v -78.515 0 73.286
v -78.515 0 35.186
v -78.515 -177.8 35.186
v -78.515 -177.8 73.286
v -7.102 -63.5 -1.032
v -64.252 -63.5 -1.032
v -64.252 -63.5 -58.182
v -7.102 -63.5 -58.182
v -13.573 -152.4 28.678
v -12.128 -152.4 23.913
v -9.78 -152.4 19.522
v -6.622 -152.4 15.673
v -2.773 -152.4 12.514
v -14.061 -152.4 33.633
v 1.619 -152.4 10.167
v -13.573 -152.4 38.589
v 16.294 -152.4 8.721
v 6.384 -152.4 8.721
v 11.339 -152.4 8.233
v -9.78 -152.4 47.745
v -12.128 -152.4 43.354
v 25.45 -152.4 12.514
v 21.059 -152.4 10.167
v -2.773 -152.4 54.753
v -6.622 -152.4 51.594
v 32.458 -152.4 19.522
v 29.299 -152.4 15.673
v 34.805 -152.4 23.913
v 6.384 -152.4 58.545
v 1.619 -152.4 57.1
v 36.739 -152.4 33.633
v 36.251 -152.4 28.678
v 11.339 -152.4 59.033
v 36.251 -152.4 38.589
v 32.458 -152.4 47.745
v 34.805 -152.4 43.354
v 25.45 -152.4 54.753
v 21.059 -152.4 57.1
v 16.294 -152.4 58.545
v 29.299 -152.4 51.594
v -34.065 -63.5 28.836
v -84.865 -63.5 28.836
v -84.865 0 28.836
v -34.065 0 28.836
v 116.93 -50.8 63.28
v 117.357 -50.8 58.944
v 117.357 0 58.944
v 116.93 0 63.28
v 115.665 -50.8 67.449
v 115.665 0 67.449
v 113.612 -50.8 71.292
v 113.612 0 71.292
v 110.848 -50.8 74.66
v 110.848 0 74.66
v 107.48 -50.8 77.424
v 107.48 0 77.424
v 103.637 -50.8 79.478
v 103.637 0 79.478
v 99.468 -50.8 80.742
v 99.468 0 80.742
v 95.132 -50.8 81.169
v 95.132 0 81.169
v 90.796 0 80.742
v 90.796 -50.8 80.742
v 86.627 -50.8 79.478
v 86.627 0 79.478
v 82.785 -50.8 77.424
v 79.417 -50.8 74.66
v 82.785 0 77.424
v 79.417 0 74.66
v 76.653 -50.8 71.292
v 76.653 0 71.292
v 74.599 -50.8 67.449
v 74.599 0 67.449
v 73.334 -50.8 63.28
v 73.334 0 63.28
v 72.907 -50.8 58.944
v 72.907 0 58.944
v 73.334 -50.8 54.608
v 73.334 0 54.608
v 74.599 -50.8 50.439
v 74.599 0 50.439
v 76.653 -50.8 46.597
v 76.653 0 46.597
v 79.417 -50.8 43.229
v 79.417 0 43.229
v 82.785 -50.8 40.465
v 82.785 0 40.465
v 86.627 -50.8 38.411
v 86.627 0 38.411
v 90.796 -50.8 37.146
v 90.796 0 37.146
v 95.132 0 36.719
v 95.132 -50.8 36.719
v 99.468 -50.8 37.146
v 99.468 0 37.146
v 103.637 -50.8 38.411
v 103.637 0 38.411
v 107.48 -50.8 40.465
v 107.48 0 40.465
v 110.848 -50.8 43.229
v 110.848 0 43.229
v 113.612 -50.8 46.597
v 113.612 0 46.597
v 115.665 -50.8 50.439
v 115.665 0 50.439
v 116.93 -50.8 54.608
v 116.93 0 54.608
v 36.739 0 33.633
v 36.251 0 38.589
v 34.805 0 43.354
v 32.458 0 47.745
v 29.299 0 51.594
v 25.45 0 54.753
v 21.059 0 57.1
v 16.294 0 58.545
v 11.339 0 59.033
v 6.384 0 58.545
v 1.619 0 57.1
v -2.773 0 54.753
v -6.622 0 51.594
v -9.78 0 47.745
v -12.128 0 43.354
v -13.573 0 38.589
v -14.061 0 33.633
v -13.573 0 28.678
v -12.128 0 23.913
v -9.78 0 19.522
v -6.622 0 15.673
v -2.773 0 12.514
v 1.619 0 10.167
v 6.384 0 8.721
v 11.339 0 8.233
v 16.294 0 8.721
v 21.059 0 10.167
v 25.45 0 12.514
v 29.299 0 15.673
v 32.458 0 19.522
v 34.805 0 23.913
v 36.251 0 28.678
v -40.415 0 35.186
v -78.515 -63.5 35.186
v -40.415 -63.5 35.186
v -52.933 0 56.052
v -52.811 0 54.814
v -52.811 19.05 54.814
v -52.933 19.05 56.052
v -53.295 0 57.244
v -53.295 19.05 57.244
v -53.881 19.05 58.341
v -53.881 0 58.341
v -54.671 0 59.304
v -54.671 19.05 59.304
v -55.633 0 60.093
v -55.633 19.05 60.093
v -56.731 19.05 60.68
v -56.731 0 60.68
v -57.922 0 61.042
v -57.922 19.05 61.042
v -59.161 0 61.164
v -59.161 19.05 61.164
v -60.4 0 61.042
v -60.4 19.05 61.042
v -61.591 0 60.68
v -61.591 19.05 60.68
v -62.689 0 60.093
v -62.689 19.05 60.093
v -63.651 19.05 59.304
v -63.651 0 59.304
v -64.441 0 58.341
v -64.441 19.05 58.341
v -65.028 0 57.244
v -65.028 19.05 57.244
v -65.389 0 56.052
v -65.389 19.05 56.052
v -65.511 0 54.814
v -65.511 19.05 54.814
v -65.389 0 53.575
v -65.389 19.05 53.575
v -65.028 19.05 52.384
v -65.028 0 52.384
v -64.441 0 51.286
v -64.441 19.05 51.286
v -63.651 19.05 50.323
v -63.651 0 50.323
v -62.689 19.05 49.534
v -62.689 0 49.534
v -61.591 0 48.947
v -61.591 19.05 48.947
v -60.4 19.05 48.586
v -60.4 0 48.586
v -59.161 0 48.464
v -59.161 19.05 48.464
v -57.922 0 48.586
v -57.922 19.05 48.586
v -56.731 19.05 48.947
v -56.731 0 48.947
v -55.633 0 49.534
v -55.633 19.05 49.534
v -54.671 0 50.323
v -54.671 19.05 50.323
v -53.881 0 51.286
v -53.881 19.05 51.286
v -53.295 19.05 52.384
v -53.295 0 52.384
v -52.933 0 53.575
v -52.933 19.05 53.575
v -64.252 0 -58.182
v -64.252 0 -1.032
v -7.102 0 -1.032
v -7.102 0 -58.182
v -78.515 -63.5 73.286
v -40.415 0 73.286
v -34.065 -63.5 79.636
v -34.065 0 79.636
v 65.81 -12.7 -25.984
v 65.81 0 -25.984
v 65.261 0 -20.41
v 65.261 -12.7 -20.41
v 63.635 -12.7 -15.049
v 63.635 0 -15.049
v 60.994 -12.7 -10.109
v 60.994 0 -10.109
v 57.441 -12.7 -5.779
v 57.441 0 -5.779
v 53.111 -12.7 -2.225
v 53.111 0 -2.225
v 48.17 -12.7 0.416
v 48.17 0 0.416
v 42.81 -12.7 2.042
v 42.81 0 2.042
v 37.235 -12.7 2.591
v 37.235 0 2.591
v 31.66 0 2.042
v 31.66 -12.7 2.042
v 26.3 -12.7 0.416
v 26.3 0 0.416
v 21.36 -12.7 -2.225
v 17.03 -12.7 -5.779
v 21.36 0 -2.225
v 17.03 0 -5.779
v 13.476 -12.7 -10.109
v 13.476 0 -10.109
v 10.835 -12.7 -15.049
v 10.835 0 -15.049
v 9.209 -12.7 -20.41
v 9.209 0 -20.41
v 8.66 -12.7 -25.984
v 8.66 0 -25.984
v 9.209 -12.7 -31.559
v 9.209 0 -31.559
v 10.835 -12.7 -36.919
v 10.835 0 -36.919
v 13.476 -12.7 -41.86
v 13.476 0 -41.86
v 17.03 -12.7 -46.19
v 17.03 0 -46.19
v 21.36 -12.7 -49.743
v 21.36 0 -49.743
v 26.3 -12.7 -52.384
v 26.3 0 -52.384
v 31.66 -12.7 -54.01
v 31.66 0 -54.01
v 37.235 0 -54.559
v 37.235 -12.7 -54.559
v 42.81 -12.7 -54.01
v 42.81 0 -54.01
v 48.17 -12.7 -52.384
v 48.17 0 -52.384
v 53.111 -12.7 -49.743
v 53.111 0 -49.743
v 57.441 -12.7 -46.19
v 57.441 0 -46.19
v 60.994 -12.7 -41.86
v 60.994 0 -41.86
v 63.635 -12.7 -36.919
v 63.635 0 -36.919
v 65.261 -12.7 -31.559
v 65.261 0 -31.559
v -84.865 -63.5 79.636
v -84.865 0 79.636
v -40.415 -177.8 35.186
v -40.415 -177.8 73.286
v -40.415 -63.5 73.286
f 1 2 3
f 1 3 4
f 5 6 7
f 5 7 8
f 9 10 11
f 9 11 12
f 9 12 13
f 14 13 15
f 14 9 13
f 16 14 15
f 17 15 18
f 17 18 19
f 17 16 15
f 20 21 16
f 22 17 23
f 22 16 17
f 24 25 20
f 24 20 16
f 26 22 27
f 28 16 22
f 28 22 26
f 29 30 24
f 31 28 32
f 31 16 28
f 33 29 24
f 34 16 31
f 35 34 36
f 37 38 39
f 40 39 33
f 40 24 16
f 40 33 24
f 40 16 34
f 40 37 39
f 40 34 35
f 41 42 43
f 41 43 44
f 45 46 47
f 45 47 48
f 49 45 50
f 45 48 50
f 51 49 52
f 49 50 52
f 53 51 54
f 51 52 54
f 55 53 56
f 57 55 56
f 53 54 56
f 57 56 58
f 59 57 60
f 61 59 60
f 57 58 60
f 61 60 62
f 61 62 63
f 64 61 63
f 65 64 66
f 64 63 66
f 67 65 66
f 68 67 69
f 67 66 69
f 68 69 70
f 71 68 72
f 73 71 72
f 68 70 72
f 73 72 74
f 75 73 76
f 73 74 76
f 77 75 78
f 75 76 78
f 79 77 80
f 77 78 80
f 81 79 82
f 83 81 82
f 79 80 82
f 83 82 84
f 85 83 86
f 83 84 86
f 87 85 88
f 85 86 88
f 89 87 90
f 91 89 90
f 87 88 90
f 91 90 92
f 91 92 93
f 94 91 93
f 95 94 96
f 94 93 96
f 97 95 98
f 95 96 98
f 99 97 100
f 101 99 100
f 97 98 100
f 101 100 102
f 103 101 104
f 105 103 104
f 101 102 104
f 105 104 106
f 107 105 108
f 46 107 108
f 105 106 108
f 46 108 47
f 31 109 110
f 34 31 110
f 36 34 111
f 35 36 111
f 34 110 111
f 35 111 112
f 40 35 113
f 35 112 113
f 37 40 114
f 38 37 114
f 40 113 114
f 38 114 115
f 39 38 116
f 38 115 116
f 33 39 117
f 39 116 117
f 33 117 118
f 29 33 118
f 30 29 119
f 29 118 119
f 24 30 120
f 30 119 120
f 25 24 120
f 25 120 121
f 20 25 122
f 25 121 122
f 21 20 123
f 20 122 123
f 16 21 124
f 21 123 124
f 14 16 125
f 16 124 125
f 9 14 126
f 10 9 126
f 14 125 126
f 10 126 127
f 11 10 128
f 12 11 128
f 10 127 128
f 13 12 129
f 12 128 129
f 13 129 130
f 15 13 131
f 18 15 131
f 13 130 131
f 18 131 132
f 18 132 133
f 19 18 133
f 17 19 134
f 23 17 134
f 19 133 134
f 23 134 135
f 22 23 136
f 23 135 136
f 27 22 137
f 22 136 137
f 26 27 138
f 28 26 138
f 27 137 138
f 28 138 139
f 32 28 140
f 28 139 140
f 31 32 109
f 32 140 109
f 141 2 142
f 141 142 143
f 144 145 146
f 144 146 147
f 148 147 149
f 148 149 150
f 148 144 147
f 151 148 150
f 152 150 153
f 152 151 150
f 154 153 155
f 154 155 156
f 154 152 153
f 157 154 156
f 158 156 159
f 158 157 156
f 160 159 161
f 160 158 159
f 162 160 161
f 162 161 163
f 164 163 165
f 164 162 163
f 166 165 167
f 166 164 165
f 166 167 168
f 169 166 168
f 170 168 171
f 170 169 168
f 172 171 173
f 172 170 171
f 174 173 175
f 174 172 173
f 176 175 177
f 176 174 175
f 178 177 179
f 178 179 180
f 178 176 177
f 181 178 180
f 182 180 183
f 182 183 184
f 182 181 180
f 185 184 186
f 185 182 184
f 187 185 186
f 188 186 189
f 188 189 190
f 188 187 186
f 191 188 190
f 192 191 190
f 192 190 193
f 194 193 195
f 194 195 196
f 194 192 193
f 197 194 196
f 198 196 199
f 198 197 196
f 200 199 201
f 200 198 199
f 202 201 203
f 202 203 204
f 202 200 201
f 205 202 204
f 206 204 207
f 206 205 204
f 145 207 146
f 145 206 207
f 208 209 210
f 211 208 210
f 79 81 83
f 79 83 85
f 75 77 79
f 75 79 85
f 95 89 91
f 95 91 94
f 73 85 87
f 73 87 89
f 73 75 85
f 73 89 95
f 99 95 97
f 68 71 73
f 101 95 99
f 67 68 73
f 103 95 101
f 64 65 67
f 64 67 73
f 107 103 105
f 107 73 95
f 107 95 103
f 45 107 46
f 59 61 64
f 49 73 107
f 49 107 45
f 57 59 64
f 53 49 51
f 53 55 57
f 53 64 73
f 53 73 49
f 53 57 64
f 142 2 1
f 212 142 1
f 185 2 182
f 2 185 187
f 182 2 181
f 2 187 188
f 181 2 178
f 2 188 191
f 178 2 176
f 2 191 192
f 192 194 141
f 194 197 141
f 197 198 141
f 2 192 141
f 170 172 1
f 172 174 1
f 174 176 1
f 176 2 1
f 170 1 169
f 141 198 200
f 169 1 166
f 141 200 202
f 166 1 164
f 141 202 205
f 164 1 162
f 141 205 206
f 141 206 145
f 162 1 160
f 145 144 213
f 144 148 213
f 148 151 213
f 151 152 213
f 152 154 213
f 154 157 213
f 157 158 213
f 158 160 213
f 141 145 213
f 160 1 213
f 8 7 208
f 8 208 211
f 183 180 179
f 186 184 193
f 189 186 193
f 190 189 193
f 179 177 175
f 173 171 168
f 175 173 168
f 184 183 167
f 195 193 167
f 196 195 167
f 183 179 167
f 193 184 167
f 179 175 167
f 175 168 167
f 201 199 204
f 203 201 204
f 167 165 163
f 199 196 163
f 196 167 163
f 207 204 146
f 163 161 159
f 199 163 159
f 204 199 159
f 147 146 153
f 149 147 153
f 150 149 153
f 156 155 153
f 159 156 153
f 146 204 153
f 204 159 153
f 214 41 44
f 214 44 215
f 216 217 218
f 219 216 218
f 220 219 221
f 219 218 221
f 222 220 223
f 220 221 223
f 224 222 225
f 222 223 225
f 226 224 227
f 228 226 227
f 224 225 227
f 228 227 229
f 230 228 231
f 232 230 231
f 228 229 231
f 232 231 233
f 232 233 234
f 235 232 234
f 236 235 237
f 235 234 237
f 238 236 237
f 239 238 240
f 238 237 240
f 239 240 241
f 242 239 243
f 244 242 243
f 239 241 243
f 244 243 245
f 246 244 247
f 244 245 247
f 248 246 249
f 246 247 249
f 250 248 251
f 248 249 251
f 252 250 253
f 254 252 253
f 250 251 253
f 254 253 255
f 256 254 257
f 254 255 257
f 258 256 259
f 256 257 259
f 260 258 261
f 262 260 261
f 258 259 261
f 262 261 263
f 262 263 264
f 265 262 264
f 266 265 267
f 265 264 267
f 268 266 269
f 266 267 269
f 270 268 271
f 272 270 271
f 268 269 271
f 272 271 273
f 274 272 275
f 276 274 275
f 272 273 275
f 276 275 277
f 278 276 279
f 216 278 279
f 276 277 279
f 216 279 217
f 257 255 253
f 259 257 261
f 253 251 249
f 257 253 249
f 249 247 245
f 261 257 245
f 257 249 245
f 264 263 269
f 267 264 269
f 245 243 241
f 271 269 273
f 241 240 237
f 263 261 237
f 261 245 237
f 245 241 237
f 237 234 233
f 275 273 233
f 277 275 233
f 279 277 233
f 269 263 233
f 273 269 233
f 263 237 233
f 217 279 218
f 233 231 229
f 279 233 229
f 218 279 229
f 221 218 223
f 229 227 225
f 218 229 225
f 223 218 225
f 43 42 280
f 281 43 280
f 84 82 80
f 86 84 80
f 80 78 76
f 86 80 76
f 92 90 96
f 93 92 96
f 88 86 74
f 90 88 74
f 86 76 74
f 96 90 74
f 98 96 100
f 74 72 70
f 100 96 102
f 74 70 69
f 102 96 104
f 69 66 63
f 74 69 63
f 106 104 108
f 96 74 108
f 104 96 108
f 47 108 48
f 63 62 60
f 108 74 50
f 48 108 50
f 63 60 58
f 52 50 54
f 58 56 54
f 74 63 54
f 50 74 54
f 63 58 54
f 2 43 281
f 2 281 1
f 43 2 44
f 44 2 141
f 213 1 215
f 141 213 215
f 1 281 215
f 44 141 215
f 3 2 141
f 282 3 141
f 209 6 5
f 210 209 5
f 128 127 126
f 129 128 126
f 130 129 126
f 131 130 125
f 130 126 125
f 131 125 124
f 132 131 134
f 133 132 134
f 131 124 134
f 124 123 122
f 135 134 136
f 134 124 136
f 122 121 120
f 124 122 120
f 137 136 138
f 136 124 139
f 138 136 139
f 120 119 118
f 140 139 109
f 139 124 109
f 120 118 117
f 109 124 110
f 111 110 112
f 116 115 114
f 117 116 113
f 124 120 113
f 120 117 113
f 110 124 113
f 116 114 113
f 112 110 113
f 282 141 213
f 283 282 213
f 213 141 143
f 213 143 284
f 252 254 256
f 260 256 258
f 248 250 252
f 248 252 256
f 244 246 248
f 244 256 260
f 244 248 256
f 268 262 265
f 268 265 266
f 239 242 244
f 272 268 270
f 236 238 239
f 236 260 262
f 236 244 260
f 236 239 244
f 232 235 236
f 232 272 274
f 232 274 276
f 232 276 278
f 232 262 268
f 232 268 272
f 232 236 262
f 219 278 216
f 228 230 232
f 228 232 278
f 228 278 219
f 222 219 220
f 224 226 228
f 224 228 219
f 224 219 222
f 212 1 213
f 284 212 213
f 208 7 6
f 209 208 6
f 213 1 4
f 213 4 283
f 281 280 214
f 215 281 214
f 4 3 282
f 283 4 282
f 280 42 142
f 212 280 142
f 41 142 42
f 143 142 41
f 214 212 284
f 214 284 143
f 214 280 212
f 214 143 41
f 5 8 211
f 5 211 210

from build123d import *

# Parameters (mm, degrees)
F0_R     = 25.4
F1_DEPTH = 152.4
F0_R_2   = 28.575
F2_DEPTH = 12.7
F0_W     = 57.15
F0_H     = 57.15
F3_DEPTH = 63.5
F0_W_2   = 38.1
F0_H_2   = 38.1
F0_R_3   = 6.35
F4_DEPTH = 177.8
F0_W_3   = 50.8
F0_H_3   = 50.8
F5_DEPTH = 63.5
F6_DEPTH = 19.05
F0_R_4   = 22.225
F7_DEPTH = 50.8


with BuildPart() as f1:
    # F0 (on Front) → F1 (new body)
    with BuildSketch(Plane.XZ):
        with Locations((11.338911, 33.633385)):
            Circle(F0_R)
    extrude(amount=F1_DEPTH)


with BuildPart() as f2:
    # F0 (on Front) → F2 (new body)
    with BuildSketch(Plane.XZ):
        with Locations((37.235141, -25.984231)):
            Circle(F0_R_2)
    extrude(amount=F2_DEPTH)


with BuildPart() as f3:
    # F0 (on Front) → F3 (new body)
    with BuildSketch(Plane.XZ):
        with Locations((-35.676989, -29.606901)):
            Rectangle(F0_W, F0_H)
    extrude(amount=F3_DEPTH)


with BuildPart() as f4:
    # F0 (on Front) → F4 (new body)
    with BuildSketch(Plane.XZ):
        with Locations((-59.465182, 54.235836)):
            Rectangle(F0_W_2, F0_H_2)
        with Locations((-59.161171, 54.813579)):
            Circle(F0_R_3, mode=Mode.SUBTRACT)
        with Locations((-59.161171, 54.813579)):
            Circle(F0_R_3)
    extrude(amount=F4_DEPTH)

    # F0 (on Front) → F6 (join)
    with BuildSketch(Plane.XZ):
        with Locations((-59.161171, 54.813579)):
            Circle(F0_R_3)
    extrude(amount=-F6_DEPTH)


with BuildPart() as f5:
    # F0 (on Front) → F5 (new body)
    with BuildSketch(Plane.XZ):
        with Locations((-59.465182, 54.235836)):
            Rectangle(F0_W_3, F0_H_3)
        with Locations((-59.465182, 54.235836)):
            Rectangle(F0_W_2, F0_H_2, mode=Mode.SUBTRACT)
    extrude(amount=F5_DEPTH)


with BuildPart() as f7:
    # F0 (on Front) → F7 (new body)
    with BuildSketch(Plane.XZ):
        with Locations((95.13209, 58.944352)):
            Circle(F0_R_4)
    extrude(amount=F7_DEPTH)


solid = Compound([f1.part, f2.part, f3.part, f4.part, f5.part, f7.part])
